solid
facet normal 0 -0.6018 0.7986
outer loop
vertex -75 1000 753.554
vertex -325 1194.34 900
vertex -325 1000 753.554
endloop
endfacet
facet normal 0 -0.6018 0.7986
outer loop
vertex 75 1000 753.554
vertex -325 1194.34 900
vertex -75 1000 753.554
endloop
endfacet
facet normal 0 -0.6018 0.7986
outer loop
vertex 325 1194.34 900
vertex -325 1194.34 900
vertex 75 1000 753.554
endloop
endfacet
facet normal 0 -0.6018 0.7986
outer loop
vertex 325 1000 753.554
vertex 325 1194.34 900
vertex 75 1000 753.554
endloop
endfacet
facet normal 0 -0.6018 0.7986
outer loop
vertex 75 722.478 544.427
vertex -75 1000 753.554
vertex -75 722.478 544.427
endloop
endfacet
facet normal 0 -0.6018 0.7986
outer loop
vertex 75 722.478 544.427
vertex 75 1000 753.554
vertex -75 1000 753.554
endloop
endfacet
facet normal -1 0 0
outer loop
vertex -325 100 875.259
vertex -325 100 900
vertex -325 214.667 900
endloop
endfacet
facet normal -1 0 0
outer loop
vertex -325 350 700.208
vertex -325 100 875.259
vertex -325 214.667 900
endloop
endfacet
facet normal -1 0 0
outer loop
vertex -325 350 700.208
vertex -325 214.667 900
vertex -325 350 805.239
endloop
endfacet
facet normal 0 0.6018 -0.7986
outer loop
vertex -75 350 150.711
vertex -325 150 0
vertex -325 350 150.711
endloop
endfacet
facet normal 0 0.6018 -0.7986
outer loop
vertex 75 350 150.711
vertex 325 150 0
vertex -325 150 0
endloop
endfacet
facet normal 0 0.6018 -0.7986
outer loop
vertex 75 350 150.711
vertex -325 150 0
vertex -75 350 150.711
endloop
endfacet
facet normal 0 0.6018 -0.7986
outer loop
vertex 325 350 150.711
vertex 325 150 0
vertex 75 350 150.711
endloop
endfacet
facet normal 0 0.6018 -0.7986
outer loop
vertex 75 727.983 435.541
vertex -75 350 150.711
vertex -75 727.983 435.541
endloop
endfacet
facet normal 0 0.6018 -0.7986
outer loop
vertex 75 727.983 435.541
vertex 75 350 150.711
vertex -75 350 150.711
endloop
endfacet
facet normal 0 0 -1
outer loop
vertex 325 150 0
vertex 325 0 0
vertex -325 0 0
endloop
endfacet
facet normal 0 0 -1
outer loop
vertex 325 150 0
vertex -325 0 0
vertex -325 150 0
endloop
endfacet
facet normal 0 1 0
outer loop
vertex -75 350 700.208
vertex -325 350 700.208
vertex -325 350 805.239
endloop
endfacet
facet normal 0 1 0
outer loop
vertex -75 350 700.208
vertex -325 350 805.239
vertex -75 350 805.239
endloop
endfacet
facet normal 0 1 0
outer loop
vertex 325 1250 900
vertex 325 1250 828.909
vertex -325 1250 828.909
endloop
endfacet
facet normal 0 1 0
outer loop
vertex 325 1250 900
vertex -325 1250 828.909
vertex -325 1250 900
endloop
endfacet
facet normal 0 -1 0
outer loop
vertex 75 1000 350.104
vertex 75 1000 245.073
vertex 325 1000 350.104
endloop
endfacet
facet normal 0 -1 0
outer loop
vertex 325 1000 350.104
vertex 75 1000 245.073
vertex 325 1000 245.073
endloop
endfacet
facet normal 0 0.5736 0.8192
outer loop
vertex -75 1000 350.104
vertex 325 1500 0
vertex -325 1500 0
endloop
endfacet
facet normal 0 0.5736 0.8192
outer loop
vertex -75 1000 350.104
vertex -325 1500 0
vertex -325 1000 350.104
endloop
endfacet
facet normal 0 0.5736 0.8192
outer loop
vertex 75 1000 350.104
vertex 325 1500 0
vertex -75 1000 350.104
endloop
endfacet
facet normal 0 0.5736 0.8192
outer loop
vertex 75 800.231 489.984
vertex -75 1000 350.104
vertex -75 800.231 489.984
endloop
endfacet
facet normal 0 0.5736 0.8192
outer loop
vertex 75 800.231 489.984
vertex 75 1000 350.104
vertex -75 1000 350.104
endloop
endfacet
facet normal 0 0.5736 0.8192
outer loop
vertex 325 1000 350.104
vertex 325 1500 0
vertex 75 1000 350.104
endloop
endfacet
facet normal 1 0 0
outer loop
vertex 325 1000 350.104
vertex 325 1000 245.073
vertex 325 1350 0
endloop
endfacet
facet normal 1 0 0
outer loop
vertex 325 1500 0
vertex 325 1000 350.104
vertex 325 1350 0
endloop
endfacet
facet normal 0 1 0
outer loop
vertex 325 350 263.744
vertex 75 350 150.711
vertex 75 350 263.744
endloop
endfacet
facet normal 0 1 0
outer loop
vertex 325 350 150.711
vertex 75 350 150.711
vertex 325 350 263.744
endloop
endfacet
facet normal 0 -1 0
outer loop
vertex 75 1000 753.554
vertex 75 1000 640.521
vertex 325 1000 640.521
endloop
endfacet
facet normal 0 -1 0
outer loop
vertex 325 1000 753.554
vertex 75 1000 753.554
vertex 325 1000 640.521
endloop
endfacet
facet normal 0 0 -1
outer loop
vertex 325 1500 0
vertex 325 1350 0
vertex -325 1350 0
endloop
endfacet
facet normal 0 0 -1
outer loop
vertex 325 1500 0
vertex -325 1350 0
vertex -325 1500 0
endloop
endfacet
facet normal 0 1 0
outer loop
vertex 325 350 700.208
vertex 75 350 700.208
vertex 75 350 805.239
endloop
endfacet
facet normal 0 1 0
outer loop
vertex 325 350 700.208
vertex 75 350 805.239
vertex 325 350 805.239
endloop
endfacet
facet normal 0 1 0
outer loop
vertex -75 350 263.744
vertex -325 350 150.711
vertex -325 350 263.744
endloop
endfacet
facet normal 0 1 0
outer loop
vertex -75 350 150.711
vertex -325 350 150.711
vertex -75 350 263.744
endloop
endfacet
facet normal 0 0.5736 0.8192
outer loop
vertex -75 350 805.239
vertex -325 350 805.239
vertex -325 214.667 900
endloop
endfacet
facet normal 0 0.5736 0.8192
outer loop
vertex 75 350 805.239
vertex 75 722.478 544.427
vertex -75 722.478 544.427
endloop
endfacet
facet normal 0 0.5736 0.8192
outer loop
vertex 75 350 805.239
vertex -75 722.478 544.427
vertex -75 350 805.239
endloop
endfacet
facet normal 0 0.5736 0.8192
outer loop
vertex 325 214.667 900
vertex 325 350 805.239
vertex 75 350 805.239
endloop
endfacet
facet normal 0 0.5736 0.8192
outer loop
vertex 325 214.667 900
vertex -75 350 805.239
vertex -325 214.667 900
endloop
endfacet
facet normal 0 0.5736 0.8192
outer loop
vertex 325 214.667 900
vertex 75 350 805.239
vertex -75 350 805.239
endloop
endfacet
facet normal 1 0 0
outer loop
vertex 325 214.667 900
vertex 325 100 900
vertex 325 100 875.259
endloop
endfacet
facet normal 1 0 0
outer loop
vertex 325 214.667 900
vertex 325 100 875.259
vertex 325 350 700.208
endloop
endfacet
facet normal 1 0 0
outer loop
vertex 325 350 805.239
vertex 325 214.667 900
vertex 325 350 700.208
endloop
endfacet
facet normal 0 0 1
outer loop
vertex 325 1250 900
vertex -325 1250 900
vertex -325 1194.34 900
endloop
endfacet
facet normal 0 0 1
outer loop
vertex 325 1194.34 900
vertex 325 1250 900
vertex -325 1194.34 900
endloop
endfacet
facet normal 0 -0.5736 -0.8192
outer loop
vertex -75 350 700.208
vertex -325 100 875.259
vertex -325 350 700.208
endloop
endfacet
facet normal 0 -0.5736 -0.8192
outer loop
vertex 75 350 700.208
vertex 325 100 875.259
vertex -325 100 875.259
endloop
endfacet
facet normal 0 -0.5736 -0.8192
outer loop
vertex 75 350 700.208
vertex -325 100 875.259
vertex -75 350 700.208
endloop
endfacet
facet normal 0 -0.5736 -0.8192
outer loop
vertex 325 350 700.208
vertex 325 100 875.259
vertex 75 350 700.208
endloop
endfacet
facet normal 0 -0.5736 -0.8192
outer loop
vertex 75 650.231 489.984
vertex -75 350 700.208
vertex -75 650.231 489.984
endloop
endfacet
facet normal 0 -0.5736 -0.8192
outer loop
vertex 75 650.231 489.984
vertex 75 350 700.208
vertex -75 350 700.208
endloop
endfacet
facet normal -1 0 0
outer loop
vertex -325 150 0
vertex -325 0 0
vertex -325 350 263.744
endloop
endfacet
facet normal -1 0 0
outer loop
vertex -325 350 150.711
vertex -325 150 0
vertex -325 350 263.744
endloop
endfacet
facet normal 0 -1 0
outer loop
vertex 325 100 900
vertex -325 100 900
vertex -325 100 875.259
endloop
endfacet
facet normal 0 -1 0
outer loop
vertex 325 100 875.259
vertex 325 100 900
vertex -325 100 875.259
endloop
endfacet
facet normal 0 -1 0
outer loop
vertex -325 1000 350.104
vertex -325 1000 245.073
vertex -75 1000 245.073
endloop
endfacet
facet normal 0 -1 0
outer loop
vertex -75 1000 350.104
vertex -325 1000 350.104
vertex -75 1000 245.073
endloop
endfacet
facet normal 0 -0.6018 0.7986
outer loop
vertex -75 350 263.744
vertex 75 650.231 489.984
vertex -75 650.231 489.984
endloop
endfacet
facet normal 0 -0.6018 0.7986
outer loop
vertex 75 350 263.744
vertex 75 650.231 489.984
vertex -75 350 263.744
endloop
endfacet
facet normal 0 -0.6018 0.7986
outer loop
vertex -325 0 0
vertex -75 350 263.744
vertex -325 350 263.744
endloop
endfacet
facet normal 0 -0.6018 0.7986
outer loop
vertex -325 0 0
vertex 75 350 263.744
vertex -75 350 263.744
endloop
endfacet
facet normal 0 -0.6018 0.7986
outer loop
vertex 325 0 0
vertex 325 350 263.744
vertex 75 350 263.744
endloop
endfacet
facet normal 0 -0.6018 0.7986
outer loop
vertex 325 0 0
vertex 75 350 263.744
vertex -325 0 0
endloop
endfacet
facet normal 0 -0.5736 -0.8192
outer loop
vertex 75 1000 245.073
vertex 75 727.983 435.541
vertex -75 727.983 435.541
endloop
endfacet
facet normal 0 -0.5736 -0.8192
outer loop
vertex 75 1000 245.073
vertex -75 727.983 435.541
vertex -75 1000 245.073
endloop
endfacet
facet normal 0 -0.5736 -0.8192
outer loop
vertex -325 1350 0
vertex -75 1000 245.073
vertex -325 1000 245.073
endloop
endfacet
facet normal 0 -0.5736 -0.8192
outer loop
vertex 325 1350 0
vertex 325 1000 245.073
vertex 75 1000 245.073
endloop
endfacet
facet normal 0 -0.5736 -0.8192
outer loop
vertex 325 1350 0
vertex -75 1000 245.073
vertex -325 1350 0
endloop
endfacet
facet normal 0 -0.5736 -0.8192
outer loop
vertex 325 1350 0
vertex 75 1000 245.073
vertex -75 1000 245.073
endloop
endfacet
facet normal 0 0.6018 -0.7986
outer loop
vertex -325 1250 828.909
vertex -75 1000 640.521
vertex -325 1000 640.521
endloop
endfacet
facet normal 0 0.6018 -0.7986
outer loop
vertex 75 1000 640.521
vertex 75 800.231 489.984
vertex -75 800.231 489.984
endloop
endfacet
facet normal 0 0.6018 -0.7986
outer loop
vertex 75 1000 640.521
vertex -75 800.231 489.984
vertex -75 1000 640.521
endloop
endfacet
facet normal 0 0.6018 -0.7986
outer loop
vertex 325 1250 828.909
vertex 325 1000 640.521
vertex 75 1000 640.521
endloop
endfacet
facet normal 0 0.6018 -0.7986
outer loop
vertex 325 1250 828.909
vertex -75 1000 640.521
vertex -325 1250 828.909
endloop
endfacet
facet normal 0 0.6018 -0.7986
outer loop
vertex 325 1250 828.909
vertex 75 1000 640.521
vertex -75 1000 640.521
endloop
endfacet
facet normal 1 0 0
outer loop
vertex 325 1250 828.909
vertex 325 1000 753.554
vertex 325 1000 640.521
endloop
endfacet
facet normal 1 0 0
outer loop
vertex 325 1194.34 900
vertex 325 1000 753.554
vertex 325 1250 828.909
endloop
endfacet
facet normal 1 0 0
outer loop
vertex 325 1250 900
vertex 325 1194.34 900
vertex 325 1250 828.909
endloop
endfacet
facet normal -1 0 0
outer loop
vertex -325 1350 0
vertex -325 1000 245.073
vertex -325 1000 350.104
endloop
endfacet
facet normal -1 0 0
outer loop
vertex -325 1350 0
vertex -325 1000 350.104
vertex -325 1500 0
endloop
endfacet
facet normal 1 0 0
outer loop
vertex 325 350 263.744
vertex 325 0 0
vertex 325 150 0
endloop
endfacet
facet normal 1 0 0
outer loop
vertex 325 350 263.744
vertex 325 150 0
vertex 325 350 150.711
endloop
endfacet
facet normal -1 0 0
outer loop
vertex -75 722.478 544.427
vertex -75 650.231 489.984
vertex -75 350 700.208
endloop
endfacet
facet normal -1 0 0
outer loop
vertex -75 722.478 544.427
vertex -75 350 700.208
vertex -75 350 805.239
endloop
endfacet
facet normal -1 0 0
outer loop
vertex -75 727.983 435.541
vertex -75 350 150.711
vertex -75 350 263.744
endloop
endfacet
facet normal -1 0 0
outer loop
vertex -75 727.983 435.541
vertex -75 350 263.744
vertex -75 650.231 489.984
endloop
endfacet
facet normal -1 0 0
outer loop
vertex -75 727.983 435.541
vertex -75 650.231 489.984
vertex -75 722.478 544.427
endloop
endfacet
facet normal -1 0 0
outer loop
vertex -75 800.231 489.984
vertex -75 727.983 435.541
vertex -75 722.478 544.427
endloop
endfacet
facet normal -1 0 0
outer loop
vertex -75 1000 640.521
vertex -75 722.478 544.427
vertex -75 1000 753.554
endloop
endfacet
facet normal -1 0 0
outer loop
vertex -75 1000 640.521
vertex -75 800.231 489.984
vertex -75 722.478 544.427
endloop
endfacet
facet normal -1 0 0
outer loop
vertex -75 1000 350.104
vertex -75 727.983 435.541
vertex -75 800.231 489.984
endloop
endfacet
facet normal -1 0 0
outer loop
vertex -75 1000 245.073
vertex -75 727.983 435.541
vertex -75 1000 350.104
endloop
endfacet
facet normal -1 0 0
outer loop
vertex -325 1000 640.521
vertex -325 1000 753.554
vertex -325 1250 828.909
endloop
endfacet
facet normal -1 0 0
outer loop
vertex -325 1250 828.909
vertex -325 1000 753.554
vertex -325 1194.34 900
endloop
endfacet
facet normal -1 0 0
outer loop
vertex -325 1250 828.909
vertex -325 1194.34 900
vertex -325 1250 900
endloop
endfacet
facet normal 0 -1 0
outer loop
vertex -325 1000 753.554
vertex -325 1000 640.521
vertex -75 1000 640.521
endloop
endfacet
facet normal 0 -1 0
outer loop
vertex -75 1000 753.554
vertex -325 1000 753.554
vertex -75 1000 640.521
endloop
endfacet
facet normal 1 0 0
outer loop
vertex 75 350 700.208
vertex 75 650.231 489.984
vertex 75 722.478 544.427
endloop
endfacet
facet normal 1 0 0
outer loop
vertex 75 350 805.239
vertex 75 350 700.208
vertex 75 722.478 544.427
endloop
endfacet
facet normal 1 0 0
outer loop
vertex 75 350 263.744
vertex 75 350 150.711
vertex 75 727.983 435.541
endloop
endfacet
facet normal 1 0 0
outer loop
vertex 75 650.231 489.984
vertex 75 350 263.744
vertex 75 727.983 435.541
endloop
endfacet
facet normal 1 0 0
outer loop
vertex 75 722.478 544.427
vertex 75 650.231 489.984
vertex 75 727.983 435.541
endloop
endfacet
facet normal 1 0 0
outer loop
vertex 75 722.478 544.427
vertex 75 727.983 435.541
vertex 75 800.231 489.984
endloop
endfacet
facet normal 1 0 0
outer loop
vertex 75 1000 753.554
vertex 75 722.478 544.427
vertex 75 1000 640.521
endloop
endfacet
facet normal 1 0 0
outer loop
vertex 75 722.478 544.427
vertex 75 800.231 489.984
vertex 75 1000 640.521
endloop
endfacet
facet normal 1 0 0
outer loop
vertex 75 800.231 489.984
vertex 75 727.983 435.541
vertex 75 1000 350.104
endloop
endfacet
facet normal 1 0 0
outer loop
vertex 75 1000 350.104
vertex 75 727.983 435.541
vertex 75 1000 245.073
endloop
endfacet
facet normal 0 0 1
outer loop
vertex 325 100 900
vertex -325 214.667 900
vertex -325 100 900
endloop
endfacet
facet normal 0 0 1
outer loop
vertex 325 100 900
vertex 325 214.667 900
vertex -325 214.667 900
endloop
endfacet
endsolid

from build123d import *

# Parameters (mm, degrees)
F1_DEPTH = 325
F2_W     = 250
F2_H     = 650
F3_DEPTH = 900


with BuildPart() as f1:
    # F0 (on Right) → F1 (new body, symmetric)
    with BuildSketch(Plane.YZ):
        Polygon((100, 875.2594227621), (650.2305358614, 489.9838537988), (722.4783731793, 544.4265042209), (214.6667939321, 900), (100, 900), align=None)
        Polygon((650.2305358614, 489.9838537988), (0, 0), (150, 0), (727.9826985434, 435.5412033767), align=None)
        Polygon((722.4783731793, 544.4265042209), (650.2305358614, 489.9838537988), (727.9826985434, 435.5412033767), (800.2305358614, 489.9838537988), align=None)
        Polygon((1194.3403394584, 900), (722.4783731793, 544.4265042209), (800.2305358614, 489.9838537988), (1250, 828.9094551131), (1250, 900), align=None)
        Polygon((800.2305358614, 489.9838537988), (727.9826985434, 435.5412033767), (1350, 0), (1500, 0), align=None)
    extrude(amount=F1_DEPTH, both=True)

    # F2 (on Top) → F3 (cut, through all)
    with BuildSketch(Plane.XY):
        with Locations((200, 675)):
            Rectangle(F2_W, F2_H)
        with Locations((-200, 675)):
            Rectangle(F2_W, F2_H)
    extrude(amount=F3_DEPTH, mode=Mode.SUBTRACT)


solid = f1.part
